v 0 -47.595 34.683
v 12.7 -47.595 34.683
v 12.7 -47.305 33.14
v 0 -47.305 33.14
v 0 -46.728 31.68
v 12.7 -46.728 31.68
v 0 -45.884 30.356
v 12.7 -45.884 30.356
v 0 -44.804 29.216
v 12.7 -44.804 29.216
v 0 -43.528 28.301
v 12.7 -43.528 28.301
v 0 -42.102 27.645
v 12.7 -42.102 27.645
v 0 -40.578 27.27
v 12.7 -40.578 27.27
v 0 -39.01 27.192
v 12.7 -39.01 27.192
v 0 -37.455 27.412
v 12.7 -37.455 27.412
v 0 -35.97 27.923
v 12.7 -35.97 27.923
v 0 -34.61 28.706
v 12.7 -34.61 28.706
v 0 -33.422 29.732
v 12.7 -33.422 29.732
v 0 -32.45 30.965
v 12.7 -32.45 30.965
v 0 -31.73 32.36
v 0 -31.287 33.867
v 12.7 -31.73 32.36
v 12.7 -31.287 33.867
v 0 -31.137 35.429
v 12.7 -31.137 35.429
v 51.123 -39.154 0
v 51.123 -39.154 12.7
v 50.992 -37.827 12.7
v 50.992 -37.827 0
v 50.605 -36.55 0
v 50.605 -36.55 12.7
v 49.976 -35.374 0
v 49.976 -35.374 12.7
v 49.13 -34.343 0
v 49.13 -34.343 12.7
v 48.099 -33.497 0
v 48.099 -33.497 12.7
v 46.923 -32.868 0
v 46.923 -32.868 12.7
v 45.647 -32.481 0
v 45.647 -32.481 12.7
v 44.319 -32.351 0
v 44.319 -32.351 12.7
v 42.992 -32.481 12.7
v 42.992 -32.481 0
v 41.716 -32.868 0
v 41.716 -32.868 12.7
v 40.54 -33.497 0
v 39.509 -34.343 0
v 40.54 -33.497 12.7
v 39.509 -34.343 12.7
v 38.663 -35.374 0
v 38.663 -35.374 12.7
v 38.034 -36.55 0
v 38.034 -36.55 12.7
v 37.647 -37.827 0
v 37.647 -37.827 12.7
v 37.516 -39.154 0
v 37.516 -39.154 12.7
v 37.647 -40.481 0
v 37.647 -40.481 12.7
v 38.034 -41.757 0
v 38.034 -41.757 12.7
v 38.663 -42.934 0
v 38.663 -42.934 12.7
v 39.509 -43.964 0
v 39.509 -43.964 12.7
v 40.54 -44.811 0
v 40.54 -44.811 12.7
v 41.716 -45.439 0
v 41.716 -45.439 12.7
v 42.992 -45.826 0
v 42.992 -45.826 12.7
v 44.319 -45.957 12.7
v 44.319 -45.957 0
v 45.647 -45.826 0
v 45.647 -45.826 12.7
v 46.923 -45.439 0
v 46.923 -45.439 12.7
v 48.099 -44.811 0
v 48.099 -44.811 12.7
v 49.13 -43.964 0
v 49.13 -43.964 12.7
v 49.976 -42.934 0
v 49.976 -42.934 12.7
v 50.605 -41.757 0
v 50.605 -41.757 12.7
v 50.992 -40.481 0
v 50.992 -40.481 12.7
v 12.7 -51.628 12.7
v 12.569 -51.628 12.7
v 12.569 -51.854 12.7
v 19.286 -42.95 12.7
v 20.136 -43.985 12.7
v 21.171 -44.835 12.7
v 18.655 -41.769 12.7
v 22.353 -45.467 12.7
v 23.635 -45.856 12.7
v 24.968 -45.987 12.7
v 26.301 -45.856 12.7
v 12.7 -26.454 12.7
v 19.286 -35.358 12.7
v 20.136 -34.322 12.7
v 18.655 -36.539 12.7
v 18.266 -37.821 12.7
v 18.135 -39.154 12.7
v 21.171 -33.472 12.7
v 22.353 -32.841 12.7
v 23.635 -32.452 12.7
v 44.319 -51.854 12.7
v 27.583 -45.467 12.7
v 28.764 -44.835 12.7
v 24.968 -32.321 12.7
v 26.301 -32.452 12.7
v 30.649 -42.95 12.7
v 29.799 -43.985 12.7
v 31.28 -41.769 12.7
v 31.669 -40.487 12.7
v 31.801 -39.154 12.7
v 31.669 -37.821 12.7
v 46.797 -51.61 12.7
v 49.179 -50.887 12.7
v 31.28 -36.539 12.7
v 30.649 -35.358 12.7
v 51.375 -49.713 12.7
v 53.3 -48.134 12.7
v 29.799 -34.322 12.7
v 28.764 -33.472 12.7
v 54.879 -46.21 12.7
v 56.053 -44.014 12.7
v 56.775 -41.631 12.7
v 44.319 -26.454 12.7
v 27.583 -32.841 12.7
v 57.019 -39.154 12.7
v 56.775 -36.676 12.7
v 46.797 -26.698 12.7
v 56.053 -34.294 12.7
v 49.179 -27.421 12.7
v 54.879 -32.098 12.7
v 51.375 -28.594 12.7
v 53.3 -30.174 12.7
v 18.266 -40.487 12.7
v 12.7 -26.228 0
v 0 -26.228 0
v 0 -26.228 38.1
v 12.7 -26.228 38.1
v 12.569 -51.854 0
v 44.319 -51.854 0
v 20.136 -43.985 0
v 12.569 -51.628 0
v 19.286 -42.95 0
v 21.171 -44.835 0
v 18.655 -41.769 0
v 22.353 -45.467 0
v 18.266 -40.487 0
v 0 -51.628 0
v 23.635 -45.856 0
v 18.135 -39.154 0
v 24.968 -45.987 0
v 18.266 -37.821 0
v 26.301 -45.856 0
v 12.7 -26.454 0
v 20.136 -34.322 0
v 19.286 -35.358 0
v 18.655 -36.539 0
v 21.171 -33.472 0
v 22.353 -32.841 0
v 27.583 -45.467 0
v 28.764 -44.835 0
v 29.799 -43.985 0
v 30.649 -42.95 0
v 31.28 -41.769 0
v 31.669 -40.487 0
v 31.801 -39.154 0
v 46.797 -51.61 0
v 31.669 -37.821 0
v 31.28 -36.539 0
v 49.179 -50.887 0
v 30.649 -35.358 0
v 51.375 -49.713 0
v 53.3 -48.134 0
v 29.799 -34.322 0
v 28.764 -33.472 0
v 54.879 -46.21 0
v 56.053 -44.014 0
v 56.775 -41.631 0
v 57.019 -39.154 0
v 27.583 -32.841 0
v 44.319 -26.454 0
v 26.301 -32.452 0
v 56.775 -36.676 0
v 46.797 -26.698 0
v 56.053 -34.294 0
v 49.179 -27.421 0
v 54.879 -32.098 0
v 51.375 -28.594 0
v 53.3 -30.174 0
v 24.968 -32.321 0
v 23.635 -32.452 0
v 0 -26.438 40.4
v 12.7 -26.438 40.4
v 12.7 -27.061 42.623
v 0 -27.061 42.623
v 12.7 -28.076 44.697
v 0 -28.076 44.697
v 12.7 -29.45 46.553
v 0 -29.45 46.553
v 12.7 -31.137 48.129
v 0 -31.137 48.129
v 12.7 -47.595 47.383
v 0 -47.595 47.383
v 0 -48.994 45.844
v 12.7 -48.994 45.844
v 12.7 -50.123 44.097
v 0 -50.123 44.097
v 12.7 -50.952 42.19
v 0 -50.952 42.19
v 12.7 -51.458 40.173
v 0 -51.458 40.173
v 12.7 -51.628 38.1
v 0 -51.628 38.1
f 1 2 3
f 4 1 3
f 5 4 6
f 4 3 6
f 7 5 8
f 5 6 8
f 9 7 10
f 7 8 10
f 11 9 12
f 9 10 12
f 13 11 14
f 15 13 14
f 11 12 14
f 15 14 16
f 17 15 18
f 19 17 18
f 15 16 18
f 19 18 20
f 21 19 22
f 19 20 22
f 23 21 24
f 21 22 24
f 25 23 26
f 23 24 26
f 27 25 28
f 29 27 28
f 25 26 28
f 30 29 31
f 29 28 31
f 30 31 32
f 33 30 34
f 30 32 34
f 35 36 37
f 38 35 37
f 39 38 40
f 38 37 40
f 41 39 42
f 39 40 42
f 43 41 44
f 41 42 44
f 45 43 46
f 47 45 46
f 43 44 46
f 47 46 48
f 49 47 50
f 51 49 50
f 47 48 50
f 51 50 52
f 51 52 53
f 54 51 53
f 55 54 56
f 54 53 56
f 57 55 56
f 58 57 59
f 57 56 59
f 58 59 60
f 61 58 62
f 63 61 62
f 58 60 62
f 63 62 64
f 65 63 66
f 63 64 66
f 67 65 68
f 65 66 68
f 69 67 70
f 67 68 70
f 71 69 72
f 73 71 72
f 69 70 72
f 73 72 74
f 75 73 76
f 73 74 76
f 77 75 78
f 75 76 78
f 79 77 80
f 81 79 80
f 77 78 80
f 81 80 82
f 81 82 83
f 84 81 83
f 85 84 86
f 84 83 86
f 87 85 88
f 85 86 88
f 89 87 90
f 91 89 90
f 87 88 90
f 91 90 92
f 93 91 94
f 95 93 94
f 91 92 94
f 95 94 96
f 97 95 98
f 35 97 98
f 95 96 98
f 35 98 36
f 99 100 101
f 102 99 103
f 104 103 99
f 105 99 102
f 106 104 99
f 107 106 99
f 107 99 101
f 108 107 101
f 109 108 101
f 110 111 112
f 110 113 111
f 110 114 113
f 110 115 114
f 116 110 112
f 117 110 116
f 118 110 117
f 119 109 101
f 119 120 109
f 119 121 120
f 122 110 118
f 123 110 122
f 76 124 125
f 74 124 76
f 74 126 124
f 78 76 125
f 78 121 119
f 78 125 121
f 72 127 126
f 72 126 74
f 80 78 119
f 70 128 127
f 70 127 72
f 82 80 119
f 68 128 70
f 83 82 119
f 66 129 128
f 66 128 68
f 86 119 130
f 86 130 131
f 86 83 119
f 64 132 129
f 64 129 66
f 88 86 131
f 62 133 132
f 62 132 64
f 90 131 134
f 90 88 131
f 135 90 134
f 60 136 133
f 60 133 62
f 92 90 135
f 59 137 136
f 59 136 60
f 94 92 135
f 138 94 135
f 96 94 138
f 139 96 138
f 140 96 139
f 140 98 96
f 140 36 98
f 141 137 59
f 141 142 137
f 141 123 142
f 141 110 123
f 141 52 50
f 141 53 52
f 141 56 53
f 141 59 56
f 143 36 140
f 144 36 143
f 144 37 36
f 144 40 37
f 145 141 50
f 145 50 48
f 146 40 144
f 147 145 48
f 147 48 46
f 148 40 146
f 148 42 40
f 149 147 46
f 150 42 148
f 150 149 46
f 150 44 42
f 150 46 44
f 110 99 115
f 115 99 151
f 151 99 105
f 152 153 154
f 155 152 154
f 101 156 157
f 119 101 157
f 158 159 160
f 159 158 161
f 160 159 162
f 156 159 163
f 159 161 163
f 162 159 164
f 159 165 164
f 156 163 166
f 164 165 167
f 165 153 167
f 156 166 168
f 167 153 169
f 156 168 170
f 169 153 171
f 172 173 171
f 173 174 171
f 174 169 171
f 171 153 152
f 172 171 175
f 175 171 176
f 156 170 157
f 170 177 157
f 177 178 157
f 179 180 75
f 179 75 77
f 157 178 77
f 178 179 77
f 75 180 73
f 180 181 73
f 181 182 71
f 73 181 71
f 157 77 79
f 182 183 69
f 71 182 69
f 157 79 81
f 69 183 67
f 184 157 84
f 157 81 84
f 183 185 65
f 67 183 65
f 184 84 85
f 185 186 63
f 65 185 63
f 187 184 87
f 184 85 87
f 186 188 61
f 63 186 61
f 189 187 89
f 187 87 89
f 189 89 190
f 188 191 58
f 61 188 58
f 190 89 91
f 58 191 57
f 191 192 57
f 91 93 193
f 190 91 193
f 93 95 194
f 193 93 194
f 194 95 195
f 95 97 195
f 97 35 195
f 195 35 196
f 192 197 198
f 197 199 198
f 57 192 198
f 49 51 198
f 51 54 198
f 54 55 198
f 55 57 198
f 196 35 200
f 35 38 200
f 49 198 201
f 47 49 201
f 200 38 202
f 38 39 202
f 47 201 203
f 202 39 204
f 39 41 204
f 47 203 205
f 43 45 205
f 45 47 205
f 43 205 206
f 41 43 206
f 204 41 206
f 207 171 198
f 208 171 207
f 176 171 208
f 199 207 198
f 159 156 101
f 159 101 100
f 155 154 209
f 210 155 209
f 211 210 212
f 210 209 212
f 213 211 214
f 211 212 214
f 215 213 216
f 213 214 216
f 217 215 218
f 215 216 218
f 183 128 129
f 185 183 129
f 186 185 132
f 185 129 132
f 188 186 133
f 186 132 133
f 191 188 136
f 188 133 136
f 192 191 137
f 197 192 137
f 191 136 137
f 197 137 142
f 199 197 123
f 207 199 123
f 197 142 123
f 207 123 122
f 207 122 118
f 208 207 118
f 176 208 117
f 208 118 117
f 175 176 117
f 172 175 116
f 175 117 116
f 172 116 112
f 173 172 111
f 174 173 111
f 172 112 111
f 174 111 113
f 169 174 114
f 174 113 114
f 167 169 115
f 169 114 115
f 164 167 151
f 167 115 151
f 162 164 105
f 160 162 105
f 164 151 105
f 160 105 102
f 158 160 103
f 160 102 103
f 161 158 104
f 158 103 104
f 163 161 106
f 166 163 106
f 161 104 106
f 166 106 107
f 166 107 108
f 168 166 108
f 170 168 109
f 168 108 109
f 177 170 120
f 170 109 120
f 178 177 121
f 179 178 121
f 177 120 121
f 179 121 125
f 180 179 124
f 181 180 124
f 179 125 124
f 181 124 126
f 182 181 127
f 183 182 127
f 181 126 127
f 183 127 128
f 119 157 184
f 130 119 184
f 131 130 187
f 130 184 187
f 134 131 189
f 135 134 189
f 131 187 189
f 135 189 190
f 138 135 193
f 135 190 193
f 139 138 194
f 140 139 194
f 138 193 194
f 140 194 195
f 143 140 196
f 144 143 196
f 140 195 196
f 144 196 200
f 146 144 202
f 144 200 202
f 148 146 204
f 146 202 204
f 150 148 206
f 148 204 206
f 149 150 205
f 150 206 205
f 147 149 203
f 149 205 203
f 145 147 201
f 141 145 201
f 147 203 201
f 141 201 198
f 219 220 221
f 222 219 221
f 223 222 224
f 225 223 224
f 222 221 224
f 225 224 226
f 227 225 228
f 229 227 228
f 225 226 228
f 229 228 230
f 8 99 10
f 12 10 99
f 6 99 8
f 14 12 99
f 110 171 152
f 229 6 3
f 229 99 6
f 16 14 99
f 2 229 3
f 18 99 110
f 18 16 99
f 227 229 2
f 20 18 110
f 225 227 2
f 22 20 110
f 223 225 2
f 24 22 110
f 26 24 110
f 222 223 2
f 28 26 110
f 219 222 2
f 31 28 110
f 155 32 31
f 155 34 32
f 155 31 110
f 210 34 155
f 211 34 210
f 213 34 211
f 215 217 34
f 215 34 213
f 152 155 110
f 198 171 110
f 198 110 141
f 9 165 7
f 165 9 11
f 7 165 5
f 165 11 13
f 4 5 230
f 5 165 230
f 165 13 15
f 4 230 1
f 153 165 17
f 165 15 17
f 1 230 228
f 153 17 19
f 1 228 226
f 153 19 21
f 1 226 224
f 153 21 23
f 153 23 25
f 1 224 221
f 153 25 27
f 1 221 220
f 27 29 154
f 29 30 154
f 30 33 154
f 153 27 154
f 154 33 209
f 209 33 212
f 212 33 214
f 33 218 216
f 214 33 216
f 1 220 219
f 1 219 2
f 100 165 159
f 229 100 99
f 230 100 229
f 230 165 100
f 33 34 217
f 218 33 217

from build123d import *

# Parameters (mm, degrees)
F0_W     = 25.4
F0_H     = 38.1
F1_DEPTH = 12.7
F2_W     = 31.75
F2_H     = 25.4
F3_DEPTH = 12.7
F5_DEPTH = 12.7
F6_R     = 6.832964
F6_R_2   = 6.803231
F7_DEPTH = 12.7


with BuildPart() as f1:
    # F0 (on Right) → F1 (new body)
    with BuildSketch(Plane.YZ):
        with Locations((-38.928264, 19.05)):
            Rectangle(F0_W, F0_H)
        with BuildLine():
            ThreePointArc((-26.228264, 38.1), (-38.928264, 50.8), (-51.628264, 38.1))
            Line((-51.628264, 38.1), (-26.228264, 38.1))
        make_face()
    extrude(amount=F1_DEPTH)

    # F2 (on Top) → F3 (join)
    with BuildSketch(Plane.XY):
        with BuildLine():
            ThreePointArc((44.319397, -51.85383), (57.019397, -39.15383), (44.319397, -26.45383))
            Line((44.319397, -26.45383), (44.319397, -51.85383))
        make_face()
        with Locations((28.444397, -39.15383)):
            Rectangle(F2_W, F2_H)
    extrude(amount=F3_DEPTH)

    # F4 (on face) → F5 (cut)
    with BuildSketch(Plane.YZ.offset(12.7)):
        with BuildLine():
            ThreePointArc((-31.137236, 48.129451), (-39.756961, 56.367), (-47.595407, 47.382814))
            ThreePointArc((-47.595407, 47.382814), (-39.503817, 50.786951), (-31.137236, 48.129451))
        make_face()
        with BuildLine():
            ThreePointArc((-31.137236, 48.129451), (-39.503817, 50.786951), (-47.595407, 47.382814))
            Line((-47.595407, 47.382814), (-47.595407, 34.682814))
            ThreePointArc((-47.595407, 34.682814), (-39.009555, 27.191903), (-31.137236, 35.429451))
            Line((-31.137236, 35.429451), (-31.137236, 48.129451))
        make_face()
    extrude(amount=-F5_DEPTH, mode=Mode.SUBTRACT)

    # F6 (on face) → F7 (cut)
    with BuildSketch(Plane.XY.offset(12.7)):
        with Locations((24.967661, -39.15383)):
            Circle(F6_R)
        with Locations((44.319397, -39.15383)):
            Circle(F6_R_2)
    extrude(amount=-F7_DEPTH, mode=Mode.SUBTRACT)


solid = f1.part
